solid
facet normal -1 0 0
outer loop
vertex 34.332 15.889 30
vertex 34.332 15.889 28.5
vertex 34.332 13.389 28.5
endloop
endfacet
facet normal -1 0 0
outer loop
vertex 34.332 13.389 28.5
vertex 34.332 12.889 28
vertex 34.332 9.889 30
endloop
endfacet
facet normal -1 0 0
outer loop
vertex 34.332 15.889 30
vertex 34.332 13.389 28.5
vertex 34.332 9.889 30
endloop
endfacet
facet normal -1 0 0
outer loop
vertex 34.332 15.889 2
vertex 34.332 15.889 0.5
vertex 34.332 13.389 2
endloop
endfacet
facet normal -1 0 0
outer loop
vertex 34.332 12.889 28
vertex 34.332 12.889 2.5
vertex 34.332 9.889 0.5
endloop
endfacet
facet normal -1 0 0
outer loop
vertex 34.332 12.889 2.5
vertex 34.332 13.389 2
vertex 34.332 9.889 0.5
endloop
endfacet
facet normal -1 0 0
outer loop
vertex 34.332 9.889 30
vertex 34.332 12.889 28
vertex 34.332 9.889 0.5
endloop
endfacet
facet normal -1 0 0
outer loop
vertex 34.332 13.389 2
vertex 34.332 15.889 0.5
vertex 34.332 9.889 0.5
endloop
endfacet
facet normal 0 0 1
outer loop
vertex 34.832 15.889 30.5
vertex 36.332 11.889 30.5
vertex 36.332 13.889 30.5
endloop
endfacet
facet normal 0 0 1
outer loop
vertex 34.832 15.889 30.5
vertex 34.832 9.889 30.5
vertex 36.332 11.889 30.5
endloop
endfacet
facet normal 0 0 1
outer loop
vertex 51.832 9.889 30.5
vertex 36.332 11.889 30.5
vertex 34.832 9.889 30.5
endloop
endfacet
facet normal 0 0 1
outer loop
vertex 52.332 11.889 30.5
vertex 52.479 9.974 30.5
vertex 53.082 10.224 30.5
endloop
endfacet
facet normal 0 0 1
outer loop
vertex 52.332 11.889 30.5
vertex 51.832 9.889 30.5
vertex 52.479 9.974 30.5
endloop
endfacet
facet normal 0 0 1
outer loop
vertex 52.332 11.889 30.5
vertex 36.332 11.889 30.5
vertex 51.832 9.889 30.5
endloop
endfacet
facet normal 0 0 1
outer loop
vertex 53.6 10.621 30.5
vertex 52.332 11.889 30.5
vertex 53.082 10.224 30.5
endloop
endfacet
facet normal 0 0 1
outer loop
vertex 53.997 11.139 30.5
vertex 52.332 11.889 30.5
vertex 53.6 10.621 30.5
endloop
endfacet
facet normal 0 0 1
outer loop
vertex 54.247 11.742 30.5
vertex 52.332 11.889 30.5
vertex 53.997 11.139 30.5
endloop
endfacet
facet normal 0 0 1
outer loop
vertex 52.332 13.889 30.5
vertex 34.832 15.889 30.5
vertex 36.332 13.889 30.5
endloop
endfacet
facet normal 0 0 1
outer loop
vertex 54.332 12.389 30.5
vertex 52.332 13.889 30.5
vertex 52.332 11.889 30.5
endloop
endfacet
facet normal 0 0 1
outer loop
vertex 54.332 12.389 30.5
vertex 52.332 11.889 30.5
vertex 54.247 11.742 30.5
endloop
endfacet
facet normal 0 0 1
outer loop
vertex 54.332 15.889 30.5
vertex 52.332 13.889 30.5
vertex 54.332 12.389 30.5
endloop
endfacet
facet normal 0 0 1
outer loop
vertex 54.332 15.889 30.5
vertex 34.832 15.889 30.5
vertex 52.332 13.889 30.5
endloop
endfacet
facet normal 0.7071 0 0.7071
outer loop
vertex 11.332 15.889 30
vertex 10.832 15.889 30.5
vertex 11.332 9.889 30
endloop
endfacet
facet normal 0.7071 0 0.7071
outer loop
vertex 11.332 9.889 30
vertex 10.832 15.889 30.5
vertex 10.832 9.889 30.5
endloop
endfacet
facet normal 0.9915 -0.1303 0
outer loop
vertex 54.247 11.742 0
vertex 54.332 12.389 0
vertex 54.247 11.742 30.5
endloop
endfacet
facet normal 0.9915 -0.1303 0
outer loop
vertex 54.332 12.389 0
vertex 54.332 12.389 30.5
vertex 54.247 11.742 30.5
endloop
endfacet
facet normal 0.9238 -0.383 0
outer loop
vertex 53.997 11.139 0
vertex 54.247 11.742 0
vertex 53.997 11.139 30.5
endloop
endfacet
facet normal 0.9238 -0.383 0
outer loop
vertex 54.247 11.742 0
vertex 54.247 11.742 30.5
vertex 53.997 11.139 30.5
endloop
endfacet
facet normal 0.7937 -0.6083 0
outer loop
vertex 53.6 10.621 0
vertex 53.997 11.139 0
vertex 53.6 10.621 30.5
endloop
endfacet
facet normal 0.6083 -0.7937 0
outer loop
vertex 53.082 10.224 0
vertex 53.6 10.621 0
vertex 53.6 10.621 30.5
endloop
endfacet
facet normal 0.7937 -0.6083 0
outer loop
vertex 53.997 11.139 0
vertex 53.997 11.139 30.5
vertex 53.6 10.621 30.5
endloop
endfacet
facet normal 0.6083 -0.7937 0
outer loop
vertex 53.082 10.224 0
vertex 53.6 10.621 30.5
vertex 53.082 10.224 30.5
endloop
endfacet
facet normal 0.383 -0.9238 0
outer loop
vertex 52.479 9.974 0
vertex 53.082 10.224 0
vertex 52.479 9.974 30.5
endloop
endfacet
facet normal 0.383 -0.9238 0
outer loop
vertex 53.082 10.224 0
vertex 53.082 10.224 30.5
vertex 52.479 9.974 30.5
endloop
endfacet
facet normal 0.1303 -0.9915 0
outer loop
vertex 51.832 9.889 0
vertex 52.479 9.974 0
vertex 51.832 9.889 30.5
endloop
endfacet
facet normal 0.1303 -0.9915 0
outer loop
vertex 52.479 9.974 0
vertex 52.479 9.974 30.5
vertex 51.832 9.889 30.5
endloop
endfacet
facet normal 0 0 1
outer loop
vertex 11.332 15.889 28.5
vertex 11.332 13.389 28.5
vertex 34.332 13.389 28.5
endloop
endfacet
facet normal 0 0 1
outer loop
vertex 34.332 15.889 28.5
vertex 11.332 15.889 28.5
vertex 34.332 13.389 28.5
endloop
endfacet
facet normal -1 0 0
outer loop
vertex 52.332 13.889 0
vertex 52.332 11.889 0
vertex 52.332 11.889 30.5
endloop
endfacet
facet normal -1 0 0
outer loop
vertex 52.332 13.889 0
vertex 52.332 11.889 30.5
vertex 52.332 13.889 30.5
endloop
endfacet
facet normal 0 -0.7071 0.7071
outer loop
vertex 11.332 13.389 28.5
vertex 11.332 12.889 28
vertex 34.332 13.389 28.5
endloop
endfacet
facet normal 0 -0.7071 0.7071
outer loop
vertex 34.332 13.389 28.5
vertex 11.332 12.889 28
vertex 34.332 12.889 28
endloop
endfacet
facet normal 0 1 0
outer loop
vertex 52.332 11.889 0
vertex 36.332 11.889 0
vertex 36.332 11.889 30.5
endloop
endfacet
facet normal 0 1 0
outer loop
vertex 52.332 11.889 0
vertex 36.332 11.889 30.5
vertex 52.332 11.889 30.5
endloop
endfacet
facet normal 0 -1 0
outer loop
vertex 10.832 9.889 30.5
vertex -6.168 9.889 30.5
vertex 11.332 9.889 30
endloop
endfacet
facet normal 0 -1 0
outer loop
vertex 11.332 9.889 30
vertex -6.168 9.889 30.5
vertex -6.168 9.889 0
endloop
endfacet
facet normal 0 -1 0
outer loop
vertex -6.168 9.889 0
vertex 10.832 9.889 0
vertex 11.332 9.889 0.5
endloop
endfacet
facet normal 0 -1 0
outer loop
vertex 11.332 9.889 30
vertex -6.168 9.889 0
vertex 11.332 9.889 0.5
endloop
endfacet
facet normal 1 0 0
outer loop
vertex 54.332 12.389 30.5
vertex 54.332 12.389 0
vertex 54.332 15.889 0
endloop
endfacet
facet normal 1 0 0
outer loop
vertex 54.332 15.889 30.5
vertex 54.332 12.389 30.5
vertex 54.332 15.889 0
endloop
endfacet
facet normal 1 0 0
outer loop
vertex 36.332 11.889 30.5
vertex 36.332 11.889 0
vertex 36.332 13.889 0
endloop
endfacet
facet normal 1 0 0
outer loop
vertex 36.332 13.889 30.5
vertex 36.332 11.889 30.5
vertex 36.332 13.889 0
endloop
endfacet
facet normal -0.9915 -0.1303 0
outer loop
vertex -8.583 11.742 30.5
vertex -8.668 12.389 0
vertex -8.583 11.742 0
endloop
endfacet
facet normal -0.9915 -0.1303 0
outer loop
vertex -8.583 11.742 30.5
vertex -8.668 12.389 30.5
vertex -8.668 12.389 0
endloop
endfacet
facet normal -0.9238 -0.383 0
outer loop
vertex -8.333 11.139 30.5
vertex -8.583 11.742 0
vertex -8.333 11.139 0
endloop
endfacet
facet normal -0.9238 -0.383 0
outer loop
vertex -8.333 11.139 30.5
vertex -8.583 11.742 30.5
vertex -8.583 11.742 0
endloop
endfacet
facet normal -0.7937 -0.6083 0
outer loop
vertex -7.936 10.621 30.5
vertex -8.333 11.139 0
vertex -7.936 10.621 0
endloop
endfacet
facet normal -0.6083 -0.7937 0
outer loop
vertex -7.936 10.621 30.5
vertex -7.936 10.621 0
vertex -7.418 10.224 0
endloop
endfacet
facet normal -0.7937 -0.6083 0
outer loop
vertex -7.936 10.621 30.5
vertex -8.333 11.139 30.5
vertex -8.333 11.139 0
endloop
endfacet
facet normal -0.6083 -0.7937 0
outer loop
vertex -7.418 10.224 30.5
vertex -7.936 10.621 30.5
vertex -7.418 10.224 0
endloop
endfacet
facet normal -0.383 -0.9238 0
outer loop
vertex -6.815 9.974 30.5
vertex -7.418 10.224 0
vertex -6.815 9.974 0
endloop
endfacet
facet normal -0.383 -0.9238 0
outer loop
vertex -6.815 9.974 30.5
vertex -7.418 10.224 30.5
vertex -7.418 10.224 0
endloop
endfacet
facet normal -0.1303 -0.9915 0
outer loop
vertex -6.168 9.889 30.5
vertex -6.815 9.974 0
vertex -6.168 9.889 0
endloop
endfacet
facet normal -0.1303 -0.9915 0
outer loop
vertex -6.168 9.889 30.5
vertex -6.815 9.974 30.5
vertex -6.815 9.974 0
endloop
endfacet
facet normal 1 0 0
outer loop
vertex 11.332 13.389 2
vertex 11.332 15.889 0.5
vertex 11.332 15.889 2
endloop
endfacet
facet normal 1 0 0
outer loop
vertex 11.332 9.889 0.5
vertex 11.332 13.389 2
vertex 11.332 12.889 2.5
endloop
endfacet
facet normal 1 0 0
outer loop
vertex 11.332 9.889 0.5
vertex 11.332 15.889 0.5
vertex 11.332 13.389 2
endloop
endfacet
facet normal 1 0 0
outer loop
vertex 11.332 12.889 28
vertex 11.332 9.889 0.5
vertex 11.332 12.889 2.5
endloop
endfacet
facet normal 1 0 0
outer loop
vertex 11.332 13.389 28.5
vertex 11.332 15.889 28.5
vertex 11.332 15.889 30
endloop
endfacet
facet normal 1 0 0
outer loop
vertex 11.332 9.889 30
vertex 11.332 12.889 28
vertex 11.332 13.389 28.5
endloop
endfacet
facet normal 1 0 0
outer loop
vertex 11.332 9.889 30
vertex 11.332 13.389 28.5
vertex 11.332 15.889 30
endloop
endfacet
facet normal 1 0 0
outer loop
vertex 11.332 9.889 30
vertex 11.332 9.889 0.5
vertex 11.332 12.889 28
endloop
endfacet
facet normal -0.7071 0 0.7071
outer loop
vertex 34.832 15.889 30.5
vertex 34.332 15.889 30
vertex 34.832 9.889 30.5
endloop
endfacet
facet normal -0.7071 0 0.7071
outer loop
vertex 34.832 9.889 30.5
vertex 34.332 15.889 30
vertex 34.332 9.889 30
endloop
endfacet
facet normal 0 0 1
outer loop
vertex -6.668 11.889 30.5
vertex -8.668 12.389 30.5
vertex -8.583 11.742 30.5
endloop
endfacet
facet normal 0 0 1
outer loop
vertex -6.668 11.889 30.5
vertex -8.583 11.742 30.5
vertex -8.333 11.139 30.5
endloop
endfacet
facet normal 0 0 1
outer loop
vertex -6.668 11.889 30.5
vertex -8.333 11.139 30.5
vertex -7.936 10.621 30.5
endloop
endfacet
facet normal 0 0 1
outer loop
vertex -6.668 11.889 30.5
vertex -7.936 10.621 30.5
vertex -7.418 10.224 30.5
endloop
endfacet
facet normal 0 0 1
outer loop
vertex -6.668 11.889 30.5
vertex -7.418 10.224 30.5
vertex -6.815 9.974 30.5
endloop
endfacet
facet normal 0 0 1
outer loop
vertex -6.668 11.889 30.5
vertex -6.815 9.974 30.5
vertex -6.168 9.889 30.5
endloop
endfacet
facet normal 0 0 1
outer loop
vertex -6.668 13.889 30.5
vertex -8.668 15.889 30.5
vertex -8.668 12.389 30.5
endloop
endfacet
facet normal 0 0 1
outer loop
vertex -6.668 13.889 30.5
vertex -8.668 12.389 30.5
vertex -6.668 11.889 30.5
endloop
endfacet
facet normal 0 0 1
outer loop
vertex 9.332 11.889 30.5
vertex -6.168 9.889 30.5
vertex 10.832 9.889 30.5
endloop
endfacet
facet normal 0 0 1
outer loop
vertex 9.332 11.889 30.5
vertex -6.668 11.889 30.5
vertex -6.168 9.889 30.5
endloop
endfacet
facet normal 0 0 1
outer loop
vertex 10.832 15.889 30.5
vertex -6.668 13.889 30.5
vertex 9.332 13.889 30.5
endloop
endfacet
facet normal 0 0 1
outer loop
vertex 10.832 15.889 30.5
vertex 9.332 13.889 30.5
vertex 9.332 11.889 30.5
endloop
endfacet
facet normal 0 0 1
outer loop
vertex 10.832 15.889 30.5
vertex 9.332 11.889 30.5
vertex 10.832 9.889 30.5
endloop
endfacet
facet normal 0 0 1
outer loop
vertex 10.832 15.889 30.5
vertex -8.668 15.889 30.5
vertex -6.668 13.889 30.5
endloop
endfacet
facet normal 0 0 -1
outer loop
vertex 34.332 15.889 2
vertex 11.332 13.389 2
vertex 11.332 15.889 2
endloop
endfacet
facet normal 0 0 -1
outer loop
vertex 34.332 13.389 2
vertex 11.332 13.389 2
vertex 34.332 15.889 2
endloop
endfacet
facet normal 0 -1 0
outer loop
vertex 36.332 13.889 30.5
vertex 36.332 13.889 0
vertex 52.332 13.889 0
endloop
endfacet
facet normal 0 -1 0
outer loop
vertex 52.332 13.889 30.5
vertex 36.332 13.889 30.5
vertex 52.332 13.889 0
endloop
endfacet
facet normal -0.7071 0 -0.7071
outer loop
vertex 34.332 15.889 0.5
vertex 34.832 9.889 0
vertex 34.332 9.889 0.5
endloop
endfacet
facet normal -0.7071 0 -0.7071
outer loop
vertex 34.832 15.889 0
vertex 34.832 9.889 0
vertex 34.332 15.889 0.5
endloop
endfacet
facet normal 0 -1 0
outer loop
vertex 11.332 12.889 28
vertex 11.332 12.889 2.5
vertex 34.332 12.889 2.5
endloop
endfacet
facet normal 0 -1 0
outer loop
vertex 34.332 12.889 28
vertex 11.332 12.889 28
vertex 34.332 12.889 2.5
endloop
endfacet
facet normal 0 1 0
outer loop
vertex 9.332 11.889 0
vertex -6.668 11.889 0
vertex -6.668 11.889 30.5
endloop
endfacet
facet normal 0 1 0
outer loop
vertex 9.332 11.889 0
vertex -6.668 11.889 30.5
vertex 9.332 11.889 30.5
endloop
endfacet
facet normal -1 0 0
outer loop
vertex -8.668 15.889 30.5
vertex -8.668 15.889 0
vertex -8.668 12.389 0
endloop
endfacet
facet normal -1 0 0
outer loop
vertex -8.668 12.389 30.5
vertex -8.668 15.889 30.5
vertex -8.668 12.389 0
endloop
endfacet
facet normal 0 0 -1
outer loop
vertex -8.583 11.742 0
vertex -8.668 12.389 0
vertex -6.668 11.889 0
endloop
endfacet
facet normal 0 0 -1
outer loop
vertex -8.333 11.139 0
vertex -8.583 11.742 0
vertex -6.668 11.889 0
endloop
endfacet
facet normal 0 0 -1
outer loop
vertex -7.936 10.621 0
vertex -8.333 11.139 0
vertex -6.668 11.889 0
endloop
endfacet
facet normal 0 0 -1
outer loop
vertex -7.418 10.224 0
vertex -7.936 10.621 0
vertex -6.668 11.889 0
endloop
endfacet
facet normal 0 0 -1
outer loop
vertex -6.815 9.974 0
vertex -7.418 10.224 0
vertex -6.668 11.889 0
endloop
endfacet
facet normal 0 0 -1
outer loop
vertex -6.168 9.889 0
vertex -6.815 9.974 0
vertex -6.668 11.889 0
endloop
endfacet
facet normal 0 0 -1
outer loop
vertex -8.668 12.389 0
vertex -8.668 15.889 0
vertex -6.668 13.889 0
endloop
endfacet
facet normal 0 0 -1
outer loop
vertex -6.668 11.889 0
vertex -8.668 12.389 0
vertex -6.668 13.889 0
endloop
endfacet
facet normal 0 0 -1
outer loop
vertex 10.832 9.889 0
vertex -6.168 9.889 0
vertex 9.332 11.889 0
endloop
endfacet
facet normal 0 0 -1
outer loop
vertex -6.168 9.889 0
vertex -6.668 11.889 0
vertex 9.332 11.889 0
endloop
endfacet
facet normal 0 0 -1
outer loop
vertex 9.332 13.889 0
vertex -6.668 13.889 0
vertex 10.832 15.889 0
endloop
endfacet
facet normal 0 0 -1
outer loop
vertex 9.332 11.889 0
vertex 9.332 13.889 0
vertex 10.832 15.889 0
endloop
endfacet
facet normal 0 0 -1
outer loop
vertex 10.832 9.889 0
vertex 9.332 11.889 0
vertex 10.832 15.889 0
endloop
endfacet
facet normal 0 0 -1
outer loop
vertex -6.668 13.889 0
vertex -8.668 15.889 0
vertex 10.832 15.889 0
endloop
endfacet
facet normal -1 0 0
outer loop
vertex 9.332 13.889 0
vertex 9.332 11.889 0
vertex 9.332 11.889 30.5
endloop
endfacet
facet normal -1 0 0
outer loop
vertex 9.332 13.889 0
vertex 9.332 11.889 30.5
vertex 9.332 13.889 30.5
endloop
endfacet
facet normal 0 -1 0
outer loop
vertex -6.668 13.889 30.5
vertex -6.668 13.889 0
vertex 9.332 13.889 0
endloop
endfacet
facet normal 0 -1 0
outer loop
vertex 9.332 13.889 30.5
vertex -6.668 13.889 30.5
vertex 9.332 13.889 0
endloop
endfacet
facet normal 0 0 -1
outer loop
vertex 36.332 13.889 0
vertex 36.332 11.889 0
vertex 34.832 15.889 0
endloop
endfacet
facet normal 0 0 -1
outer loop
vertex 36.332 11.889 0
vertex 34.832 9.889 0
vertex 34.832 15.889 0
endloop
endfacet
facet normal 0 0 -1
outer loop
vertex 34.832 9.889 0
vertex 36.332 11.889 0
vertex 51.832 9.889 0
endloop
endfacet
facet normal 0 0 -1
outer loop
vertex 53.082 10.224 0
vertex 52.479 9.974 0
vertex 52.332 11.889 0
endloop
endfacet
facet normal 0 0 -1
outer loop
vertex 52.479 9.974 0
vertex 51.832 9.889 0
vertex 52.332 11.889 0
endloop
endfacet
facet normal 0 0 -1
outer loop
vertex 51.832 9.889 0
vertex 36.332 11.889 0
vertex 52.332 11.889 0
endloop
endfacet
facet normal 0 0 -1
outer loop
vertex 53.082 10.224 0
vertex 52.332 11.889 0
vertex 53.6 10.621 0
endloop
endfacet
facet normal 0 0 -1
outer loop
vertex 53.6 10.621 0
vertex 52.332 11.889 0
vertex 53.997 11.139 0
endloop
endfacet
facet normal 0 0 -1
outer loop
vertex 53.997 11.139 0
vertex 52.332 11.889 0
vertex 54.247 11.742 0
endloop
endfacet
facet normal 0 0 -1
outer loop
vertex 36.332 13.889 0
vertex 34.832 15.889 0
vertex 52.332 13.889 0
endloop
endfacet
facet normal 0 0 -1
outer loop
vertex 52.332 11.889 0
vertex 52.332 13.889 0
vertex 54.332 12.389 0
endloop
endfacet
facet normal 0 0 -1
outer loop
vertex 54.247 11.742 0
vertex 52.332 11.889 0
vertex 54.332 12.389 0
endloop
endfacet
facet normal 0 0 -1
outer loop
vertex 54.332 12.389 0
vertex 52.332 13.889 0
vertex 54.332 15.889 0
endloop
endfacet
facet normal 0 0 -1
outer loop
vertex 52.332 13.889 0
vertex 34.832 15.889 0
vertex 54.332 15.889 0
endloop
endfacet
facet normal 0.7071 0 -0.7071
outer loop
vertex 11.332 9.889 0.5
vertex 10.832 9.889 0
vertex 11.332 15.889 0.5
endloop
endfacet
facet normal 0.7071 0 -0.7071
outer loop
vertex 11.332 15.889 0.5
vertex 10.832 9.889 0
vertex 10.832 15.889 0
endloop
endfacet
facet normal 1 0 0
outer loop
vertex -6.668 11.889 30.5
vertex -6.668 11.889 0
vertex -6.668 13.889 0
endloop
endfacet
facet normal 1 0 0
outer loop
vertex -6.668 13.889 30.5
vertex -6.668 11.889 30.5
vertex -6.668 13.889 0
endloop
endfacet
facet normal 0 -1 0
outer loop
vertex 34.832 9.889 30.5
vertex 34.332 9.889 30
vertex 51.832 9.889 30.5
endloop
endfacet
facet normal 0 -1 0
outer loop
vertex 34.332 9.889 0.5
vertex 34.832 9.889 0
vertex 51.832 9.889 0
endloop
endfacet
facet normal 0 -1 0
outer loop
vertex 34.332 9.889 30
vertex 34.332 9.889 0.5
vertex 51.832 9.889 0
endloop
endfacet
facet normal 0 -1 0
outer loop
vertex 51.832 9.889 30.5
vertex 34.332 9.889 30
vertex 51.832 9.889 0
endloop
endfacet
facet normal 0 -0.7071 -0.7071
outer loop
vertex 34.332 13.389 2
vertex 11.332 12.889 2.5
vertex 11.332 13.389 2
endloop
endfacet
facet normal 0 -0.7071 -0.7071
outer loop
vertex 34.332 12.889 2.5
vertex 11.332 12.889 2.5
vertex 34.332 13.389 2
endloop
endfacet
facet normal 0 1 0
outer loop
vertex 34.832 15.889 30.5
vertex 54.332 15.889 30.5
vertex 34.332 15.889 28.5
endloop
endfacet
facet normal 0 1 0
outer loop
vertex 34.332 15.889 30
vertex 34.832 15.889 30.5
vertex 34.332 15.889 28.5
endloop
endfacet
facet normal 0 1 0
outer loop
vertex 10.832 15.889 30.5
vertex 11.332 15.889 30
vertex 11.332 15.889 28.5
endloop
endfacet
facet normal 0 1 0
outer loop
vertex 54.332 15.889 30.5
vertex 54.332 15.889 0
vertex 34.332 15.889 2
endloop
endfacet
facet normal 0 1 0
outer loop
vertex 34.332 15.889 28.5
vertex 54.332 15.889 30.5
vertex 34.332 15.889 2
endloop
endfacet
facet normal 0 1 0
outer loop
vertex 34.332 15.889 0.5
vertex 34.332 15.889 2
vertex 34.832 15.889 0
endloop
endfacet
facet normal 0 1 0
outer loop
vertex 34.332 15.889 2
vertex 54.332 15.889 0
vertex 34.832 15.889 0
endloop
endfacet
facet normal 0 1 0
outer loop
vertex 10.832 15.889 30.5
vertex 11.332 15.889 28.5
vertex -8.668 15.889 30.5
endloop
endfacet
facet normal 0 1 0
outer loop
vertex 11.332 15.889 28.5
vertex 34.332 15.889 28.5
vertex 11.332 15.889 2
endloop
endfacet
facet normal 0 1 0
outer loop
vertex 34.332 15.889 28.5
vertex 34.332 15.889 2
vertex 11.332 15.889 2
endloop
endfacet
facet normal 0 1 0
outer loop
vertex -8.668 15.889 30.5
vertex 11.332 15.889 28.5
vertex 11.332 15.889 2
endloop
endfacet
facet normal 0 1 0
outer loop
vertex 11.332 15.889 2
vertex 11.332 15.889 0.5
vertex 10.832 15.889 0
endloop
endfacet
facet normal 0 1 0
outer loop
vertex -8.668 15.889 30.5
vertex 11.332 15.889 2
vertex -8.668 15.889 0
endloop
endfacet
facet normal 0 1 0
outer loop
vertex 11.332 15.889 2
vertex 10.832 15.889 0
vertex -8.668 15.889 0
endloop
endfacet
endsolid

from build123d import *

# Parameters (mm, degrees)
F0_W     = 16
F0_H     = 2
F1_DEPTH = 30.5
F2_R     = 2.5
F3_W     = 23
F3_H     = 2
F4_DEPTH = 25
F5_SIZE  = 0.5


with BuildPart() as f1:
    # F0 (on Top) → F1 (new body)
    with BuildSketch(Plane.XY):
        Polygon((54.3318165131, 15.8888510838), (-8.6681834869, 15.8888510838), (-8.6681834869, 9.8888510838), (11.3318165131, 9.8888510838), (11.3318165131, 12.8888510838), (34.3318165131, 12.8888510838), (34.3318165131, 9.8888510838), (54.3318165131, 9.8888510838), align=None)
        with Locations((1.3318165131, 12.8888510838)):
            Rectangle(F0_W, F0_H, mode=Mode.SUBTRACT)
        with Locations((44.3318165131, 12.8888510838)):
            Rectangle(F0_W, F0_H, mode=Mode.SUBTRACT)
    extrude(amount=F1_DEPTH)

    # F2
    f2_edges = [f1.edges().sort_by_distance(p)[0] for p in [
        (-8.668183, 9.888851, 15.25),
        (54.331817, 9.888851, 15.25),
    ]]
    fillet(f2_edges, radius=F2_R)

    # F3 (on face) → F4 (cut)
    with BuildSketch(Plane.XZ.offset(-12.8888510838)):
        with Locations((22.8318165131, 1)):
            Rectangle(F3_W, F3_H)
        with Locations((22.8318165131, 29.5)):
            Rectangle(F3_W, F3_H)
    extrude(amount=-F4_DEPTH, mode=Mode.SUBTRACT)

    # F5
    f5_edges = [f1.edges().sort_by_distance(p)[0] for p in [
        (11.331817, 12.888851, 30.5),
        (34.331817, 12.888851, 30.5),
        (34.331817, 12.888851, 0),
        (11.331817, 12.888851, 0),
        (22.831817, 12.888851, 2),
        (22.831817, 12.888851, 28.5),
    ]]
    chamfer(f5_edges, length=F5_SIZE)


solid = f1.part
